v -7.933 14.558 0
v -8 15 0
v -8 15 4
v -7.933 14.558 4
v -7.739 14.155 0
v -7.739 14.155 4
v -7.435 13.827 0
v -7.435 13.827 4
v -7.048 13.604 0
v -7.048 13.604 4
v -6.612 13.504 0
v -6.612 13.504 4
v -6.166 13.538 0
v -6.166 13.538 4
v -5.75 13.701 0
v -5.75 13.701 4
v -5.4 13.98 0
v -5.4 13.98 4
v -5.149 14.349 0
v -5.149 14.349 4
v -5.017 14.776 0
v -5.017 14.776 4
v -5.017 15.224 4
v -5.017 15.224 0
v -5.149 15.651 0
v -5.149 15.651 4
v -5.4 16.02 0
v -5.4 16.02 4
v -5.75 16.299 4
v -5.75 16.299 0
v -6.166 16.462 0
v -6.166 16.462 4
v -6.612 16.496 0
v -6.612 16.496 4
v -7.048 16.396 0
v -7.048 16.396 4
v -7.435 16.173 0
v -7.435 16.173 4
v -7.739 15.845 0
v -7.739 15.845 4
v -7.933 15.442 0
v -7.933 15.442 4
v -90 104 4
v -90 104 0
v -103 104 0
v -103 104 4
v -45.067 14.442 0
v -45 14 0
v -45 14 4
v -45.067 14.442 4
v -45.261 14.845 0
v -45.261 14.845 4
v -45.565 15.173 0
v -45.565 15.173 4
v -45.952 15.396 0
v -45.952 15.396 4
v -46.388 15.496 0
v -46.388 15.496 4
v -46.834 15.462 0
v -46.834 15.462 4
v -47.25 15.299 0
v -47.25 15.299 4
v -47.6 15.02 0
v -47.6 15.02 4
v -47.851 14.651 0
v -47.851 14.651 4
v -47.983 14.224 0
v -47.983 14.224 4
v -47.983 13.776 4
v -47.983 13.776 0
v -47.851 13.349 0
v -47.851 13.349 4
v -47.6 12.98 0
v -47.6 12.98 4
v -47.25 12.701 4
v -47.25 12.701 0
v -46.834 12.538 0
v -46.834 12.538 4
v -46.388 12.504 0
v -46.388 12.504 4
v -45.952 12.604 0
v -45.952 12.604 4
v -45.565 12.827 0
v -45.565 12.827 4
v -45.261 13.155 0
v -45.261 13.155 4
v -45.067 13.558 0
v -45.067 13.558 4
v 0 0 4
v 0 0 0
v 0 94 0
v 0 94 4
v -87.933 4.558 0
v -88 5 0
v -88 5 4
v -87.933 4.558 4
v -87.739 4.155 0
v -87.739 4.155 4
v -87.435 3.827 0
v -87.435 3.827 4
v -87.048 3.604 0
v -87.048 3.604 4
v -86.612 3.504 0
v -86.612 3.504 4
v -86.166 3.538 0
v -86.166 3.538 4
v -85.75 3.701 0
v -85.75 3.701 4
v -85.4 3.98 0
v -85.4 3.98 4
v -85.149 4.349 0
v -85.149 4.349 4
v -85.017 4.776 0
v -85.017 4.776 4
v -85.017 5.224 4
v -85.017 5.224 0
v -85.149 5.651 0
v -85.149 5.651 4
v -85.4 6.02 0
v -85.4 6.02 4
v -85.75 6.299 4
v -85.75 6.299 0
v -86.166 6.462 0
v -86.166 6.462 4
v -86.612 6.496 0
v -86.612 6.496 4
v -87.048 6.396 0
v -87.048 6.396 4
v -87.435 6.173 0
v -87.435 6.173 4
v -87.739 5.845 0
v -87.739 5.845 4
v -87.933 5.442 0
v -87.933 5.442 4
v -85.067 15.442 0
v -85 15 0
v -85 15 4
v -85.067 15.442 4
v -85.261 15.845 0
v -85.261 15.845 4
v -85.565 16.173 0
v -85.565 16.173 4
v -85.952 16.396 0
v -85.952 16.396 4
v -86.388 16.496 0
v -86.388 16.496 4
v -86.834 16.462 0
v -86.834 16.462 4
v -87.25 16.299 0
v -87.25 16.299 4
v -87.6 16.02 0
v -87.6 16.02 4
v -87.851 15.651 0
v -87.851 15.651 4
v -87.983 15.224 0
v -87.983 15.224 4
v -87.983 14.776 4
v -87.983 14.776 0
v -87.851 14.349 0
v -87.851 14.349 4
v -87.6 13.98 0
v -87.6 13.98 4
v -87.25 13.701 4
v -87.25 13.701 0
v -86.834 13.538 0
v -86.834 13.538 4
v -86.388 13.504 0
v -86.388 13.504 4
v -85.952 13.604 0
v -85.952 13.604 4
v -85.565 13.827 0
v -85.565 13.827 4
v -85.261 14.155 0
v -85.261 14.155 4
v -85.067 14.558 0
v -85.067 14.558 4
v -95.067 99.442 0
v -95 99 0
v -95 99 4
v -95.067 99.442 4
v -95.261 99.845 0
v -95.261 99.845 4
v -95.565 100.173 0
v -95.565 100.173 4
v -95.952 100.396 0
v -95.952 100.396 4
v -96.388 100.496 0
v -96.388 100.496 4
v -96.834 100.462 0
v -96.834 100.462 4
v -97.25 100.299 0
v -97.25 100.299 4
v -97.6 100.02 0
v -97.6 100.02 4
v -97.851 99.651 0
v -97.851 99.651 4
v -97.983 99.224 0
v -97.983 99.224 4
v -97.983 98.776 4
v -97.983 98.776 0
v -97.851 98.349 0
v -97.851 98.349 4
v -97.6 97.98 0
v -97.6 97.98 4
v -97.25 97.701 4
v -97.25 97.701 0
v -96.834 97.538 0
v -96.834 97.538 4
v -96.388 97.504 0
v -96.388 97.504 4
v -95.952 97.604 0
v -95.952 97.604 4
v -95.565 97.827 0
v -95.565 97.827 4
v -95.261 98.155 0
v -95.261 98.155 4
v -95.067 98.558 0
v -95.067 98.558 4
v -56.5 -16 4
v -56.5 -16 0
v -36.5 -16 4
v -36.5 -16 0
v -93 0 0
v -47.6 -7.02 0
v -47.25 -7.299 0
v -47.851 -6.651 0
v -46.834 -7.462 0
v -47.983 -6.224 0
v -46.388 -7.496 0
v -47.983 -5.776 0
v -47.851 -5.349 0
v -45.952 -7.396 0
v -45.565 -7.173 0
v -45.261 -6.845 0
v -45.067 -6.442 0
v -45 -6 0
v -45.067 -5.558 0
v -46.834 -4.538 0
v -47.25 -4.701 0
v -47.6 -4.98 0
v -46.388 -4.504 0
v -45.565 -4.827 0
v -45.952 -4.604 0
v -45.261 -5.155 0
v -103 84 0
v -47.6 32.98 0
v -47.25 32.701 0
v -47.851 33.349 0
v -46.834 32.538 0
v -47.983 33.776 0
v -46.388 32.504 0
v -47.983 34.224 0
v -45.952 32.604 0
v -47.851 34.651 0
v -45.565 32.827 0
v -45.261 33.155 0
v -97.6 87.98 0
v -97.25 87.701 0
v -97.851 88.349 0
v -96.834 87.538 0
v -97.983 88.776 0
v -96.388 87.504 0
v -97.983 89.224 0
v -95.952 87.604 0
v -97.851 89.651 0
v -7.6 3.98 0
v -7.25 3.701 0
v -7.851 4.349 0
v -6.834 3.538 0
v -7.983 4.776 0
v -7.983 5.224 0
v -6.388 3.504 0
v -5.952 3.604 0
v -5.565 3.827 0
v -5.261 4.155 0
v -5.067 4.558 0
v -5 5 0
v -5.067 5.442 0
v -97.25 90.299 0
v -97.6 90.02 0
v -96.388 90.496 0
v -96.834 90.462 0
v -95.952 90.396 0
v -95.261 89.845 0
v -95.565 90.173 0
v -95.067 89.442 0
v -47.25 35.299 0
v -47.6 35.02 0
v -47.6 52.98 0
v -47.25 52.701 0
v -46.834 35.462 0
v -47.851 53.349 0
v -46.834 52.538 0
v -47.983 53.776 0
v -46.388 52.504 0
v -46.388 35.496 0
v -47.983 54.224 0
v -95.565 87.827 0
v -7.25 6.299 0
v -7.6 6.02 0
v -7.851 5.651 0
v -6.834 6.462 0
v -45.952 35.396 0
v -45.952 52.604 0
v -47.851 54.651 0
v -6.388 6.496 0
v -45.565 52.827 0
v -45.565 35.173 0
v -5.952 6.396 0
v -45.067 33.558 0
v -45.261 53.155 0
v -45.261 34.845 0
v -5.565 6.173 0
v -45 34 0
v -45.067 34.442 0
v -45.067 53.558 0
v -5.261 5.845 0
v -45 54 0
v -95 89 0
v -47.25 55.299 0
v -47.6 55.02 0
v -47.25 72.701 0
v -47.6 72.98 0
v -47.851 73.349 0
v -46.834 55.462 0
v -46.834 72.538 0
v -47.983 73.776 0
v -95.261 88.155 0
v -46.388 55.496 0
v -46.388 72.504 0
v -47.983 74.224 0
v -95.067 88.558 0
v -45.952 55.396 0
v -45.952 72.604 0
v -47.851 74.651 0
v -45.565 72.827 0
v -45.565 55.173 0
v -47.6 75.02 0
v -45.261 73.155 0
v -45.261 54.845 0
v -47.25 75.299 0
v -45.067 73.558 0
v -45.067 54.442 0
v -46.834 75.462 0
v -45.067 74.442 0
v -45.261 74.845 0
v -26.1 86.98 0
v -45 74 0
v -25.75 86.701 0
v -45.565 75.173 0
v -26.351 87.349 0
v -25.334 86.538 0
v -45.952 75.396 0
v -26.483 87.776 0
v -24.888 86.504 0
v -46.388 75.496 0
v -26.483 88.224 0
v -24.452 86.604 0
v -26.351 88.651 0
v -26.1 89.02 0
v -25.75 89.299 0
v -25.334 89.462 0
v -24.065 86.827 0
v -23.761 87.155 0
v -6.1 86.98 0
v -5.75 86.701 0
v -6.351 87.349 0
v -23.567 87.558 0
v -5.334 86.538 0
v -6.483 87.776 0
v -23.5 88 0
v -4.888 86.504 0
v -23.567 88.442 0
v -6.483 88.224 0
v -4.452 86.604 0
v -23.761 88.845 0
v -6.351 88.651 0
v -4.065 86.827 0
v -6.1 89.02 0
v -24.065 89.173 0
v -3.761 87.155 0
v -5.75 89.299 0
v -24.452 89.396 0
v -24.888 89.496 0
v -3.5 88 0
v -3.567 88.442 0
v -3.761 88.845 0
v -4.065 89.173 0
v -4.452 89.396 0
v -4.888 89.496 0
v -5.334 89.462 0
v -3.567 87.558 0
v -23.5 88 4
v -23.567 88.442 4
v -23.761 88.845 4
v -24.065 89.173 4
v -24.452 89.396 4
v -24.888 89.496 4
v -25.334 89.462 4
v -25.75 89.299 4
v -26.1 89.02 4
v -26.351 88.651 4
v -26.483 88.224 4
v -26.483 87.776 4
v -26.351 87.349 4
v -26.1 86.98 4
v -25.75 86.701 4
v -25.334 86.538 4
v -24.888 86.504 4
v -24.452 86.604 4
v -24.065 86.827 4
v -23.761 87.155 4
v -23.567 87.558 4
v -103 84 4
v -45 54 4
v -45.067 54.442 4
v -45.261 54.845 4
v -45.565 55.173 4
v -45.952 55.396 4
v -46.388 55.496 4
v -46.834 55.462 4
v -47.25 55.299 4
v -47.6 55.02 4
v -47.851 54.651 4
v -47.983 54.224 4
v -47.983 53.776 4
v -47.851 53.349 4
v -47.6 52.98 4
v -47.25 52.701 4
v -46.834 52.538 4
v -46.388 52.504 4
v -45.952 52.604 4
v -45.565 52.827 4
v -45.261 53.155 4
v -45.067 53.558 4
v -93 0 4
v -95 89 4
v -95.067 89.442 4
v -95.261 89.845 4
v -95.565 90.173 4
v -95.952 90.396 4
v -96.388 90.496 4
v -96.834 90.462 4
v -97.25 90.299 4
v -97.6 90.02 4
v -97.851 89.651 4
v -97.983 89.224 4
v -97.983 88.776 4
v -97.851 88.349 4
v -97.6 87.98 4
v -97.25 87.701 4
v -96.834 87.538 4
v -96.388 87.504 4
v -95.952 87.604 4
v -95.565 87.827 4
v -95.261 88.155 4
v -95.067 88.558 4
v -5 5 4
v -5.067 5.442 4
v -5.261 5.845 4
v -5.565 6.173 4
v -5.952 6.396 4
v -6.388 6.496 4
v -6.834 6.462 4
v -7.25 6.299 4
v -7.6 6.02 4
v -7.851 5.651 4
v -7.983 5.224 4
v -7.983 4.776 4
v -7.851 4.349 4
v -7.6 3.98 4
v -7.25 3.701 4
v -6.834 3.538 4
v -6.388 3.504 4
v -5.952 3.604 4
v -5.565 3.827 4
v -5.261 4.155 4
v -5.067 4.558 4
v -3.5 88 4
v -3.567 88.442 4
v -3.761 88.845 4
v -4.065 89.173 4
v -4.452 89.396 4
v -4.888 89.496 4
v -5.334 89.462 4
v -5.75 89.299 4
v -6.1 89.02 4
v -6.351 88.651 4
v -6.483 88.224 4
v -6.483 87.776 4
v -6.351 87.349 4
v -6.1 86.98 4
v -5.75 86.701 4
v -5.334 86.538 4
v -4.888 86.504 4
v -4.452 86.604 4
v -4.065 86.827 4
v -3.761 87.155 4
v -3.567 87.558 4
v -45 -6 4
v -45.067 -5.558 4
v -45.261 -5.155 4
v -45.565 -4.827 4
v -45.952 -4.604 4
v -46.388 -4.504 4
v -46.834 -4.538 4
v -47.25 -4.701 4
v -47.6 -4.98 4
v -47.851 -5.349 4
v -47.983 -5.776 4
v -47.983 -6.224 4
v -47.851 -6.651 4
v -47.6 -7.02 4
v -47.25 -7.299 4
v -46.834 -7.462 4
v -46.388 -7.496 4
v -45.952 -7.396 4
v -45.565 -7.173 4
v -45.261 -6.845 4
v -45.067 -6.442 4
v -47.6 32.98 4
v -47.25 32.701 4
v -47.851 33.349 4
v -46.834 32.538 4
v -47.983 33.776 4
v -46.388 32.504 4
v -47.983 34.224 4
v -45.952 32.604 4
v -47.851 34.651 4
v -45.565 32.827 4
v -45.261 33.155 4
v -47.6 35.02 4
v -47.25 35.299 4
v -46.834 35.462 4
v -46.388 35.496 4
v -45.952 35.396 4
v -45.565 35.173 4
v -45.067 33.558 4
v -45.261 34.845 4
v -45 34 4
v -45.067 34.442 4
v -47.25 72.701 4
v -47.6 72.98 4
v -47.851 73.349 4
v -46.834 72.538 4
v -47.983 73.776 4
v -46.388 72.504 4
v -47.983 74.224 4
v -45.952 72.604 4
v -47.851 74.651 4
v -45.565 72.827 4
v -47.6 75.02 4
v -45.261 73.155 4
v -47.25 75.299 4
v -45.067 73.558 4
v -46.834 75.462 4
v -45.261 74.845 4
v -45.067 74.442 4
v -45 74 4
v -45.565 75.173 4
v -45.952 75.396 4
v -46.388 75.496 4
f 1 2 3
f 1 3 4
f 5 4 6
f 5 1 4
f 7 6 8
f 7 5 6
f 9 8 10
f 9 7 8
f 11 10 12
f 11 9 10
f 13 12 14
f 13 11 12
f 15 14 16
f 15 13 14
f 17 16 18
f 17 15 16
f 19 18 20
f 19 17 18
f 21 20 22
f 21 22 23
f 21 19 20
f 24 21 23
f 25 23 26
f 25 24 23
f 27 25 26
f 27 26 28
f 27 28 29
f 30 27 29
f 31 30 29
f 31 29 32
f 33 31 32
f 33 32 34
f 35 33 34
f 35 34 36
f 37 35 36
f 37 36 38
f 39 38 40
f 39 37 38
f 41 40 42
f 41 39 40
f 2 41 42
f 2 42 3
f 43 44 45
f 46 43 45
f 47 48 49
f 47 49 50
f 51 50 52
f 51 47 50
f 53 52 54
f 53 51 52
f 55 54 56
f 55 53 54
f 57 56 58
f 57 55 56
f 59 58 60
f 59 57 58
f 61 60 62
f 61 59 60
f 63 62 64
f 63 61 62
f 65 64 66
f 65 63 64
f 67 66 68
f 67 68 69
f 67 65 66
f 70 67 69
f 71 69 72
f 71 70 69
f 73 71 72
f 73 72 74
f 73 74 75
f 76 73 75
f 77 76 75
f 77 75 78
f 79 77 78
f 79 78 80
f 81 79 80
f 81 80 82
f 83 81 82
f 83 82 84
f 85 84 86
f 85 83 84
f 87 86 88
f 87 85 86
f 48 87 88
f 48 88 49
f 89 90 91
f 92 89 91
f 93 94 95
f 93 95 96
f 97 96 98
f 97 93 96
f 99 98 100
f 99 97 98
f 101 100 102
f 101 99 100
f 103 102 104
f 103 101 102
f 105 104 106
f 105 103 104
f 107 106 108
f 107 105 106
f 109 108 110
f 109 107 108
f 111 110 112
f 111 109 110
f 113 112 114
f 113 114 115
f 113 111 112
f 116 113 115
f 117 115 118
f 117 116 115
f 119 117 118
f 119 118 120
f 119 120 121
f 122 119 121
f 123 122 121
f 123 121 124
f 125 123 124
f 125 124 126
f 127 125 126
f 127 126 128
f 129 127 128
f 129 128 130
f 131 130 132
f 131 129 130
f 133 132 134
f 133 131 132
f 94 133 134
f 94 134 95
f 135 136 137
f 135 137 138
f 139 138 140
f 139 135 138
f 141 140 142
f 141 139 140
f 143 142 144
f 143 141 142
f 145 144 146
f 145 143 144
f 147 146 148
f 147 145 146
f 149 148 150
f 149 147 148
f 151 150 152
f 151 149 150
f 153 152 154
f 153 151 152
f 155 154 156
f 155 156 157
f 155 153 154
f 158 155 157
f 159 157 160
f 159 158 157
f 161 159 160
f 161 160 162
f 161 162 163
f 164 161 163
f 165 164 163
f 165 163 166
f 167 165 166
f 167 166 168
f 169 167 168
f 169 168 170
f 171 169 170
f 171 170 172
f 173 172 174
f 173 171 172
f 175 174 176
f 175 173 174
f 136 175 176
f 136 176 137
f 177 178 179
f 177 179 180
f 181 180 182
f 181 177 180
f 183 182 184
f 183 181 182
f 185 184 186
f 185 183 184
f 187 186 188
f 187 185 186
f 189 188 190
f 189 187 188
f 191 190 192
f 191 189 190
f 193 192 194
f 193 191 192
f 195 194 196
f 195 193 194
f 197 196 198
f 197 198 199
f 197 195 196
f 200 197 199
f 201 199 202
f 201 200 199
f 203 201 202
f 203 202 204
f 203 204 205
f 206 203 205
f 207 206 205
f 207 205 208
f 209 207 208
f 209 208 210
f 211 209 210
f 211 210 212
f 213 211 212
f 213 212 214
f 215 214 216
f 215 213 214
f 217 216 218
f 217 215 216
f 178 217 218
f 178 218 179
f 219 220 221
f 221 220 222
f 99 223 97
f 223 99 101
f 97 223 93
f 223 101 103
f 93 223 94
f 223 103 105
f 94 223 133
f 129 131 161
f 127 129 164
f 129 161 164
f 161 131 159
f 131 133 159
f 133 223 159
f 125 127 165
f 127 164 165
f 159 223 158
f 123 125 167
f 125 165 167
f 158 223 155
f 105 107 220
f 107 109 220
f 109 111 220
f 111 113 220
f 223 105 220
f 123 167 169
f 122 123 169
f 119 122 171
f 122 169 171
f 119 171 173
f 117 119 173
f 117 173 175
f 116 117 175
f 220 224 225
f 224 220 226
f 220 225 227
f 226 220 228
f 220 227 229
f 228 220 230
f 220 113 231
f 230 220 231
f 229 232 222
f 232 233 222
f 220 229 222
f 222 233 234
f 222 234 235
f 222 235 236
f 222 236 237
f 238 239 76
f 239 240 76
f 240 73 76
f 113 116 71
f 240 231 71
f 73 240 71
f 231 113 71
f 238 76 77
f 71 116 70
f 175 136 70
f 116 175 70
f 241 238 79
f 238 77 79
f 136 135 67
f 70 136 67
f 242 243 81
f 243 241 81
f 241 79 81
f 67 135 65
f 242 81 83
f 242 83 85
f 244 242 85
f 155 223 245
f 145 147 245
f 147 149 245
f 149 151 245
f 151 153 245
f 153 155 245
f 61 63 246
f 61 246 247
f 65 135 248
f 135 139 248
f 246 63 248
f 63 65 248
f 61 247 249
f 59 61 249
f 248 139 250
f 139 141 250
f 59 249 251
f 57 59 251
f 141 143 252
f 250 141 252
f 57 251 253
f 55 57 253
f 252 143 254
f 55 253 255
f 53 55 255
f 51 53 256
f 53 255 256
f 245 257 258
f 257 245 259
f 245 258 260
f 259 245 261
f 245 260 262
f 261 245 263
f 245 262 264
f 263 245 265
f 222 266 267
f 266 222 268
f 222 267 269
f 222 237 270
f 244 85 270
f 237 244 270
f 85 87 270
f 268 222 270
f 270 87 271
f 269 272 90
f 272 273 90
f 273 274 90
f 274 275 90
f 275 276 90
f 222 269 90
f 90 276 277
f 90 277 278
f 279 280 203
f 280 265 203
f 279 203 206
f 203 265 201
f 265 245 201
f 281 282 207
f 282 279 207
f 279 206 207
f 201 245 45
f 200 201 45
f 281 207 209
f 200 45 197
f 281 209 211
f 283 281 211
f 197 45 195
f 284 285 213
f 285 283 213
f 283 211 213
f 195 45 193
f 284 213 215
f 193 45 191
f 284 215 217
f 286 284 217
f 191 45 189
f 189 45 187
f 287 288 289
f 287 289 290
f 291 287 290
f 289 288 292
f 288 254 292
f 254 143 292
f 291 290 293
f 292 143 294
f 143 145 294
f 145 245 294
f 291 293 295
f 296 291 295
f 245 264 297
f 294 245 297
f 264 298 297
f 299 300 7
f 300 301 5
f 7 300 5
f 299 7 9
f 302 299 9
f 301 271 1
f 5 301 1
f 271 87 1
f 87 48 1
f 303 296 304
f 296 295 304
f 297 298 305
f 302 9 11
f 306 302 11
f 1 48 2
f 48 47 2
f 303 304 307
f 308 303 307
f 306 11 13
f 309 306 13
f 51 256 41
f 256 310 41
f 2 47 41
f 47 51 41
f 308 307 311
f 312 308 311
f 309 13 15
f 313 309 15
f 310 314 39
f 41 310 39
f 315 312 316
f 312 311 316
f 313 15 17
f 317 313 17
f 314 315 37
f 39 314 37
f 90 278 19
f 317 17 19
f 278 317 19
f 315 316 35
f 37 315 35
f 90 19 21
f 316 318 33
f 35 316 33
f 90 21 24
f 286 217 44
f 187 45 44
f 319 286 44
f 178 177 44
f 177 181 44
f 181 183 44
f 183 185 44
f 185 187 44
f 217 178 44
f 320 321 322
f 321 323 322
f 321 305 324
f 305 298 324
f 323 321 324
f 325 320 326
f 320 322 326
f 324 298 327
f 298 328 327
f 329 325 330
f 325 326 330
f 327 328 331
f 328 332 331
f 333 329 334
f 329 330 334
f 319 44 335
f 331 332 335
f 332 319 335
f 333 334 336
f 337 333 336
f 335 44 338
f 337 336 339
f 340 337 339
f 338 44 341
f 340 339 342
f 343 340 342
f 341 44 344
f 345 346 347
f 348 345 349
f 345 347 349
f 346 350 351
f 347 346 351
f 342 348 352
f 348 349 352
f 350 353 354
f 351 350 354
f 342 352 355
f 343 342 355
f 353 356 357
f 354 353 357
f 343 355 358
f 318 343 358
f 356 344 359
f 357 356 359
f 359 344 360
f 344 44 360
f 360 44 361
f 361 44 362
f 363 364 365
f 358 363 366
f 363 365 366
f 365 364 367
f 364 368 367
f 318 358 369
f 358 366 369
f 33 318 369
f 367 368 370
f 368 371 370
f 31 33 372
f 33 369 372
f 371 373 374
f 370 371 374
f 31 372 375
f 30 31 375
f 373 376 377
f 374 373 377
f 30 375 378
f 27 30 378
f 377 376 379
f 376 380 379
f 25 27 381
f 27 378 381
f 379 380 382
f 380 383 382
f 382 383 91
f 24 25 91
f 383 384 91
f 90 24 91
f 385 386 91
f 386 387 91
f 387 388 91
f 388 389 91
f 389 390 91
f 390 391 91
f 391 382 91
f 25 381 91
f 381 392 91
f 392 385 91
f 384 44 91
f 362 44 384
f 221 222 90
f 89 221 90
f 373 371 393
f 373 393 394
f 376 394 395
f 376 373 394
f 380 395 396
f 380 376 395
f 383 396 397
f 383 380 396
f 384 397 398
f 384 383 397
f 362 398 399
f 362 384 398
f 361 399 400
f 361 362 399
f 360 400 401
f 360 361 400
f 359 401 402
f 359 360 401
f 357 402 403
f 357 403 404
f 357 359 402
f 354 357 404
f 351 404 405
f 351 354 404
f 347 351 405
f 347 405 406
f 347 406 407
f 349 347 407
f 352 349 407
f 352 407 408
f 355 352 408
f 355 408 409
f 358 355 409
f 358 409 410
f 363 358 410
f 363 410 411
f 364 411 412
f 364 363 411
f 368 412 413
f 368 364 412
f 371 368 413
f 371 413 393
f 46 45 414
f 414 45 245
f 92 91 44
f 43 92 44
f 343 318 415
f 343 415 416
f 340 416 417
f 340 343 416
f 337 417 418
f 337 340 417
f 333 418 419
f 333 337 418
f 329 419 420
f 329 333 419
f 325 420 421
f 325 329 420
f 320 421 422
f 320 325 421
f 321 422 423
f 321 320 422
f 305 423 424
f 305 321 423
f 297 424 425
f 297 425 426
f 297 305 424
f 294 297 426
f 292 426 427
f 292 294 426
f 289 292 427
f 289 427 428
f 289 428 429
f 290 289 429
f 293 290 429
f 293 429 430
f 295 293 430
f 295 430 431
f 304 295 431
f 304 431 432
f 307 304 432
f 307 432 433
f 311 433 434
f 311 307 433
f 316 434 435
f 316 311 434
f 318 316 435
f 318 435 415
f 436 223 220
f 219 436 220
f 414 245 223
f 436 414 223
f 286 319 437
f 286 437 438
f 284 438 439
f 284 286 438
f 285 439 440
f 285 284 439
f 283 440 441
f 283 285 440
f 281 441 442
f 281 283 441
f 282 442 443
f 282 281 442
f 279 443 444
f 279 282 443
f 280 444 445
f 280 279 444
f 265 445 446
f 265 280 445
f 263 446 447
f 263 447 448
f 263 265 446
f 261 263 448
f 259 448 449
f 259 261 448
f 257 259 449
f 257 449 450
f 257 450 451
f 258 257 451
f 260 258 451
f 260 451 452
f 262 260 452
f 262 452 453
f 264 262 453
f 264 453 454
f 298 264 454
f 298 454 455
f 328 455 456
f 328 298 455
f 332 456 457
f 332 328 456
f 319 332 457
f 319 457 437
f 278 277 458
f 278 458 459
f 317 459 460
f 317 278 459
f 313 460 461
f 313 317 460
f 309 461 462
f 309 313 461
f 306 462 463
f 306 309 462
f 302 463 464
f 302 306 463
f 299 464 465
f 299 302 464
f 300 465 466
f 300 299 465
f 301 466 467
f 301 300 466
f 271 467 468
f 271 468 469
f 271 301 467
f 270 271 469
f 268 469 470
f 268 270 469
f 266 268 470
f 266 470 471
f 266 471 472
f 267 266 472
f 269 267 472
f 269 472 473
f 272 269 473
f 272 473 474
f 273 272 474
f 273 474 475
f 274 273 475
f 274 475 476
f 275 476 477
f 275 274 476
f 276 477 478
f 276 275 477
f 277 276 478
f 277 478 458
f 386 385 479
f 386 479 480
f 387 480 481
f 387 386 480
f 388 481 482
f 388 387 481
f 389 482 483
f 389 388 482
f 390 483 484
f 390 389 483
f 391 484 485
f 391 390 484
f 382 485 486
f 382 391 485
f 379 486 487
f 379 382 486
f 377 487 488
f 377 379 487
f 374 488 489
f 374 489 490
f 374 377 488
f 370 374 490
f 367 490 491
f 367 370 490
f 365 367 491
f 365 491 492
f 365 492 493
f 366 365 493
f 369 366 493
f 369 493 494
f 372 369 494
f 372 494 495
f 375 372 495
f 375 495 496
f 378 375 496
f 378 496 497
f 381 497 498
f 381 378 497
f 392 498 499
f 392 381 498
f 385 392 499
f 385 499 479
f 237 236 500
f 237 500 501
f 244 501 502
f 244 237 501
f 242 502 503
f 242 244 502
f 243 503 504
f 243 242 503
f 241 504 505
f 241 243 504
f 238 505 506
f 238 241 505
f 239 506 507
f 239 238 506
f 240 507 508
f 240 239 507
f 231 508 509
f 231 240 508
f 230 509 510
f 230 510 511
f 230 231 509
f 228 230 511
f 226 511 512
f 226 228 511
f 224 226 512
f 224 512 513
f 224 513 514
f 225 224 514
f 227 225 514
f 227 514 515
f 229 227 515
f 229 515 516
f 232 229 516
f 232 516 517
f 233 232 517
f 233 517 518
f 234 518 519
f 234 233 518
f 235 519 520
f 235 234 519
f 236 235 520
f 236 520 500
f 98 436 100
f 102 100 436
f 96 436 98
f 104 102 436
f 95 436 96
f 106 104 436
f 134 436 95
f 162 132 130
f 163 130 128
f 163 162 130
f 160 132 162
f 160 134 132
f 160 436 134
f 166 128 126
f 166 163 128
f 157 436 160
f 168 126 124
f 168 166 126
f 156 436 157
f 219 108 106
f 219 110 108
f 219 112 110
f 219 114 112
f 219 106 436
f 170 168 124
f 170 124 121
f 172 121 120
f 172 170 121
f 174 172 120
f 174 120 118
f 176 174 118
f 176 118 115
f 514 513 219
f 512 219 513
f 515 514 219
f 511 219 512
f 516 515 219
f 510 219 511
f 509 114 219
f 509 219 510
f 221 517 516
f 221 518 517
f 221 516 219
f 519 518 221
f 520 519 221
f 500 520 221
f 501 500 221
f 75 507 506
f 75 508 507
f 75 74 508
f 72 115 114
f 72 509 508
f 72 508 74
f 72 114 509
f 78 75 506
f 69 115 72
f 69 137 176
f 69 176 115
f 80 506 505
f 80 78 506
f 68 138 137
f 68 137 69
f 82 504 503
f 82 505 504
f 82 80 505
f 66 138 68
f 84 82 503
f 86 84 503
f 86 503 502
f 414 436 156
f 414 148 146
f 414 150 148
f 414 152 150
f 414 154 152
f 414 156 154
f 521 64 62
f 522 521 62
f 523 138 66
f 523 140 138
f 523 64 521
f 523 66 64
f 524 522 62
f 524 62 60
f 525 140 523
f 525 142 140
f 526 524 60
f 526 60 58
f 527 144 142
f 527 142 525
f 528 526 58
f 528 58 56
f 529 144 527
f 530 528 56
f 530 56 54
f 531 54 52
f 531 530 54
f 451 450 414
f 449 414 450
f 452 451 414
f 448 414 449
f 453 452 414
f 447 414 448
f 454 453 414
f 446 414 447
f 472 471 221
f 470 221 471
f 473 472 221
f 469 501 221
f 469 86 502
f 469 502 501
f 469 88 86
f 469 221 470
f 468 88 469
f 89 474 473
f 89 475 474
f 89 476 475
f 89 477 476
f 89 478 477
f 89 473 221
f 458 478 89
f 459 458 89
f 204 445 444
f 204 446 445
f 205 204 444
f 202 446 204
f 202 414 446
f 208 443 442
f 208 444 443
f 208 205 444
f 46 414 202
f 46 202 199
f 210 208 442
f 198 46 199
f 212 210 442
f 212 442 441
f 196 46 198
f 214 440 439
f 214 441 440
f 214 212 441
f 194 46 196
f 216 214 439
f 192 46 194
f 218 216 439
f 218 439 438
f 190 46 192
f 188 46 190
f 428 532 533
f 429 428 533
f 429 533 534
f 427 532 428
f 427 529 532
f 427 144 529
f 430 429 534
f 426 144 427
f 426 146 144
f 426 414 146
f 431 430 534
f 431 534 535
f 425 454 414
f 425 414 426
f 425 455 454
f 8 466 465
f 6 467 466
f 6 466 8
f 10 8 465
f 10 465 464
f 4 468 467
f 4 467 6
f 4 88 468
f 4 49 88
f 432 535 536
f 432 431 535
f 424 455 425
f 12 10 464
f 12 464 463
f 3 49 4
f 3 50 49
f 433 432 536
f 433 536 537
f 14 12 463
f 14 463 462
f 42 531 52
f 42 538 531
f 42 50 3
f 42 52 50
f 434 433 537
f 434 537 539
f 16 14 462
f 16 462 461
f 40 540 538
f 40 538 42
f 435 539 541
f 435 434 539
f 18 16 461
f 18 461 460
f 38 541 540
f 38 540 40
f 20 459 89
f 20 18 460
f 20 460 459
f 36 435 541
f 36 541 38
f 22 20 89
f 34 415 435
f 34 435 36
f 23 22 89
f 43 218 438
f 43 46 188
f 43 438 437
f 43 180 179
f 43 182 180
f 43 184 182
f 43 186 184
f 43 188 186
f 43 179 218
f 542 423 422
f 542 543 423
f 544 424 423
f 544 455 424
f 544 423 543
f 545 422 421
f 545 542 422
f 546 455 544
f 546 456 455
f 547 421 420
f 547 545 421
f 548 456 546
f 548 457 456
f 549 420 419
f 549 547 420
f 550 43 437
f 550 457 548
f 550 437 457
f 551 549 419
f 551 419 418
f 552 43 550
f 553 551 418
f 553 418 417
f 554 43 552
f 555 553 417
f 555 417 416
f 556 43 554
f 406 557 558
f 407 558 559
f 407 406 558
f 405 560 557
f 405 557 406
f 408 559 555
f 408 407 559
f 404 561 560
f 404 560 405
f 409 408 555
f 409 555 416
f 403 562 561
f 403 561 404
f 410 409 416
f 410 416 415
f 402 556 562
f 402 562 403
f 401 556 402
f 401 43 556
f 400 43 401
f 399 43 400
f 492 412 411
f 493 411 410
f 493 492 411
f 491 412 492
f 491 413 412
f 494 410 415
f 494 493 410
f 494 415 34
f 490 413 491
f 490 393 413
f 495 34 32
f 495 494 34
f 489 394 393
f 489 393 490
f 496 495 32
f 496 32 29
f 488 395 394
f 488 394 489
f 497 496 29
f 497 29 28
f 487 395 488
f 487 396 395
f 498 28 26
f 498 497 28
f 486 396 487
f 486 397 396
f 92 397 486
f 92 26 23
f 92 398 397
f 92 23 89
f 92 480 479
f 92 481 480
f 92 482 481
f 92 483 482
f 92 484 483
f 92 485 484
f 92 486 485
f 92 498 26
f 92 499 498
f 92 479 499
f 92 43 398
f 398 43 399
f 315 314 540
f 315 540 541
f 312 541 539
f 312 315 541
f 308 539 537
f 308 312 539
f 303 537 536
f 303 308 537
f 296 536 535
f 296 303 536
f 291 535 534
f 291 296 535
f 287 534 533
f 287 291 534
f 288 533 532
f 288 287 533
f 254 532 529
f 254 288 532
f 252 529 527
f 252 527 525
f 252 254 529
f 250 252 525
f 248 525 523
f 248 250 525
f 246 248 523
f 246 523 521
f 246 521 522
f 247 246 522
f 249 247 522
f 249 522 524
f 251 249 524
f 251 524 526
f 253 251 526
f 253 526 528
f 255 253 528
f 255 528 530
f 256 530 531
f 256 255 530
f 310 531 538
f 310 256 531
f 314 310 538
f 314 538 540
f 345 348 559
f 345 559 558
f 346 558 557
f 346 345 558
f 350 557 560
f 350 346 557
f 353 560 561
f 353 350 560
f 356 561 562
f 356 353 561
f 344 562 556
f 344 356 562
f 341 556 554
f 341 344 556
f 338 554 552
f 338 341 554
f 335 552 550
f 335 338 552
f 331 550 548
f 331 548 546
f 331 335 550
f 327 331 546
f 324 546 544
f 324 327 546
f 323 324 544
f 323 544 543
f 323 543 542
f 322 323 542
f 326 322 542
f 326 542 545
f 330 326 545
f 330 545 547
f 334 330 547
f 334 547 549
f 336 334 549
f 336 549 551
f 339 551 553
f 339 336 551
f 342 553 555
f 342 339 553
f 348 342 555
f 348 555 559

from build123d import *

# Parameters (mm, degrees)
SKETCH_1_R      = 1.5
EXTRUDE_1_DEPTH = 4


with BuildPart() as part:
    # 草图1 → 凸台-拉伸1 (new body)
    with BuildSketch(Plane.XY):
        Polygon((0, 0), (0, 94), (-90, 104), (-103, 104), (-103, 84), (-93, 0), (-56.5, -16), (-36.5, -16), align=None)
        with Locations((-86.5, 15)):
            Circle(SKETCH_1_R, mode=Mode.SUBTRACT)
        with Locations(Location((-86.5, 5, 0), (0, 0, 180))):
            Circle(SKETCH_1_R, mode=Mode.SUBTRACT)
        with Locations((-6.5, 5)):
            Circle(SKETCH_1_R, mode=Mode.SUBTRACT)
        with Locations(Location((-6.5, 15, 0), (0, 0, 180))):
            Circle(SKETCH_1_R, mode=Mode.SUBTRACT)
        with Locations((-96.5, 99)):
            Circle(SKETCH_1_R, mode=Mode.SUBTRACT)
        with Locations((-96.5, 89)):
            Circle(SKETCH_1_R, mode=Mode.SUBTRACT)
        with Locations((-46.5, 14)):
            Circle(SKETCH_1_R, mode=Mode.SUBTRACT)
        with Locations((-46.5, 34)):
            Circle(SKETCH_1_R, mode=Mode.SUBTRACT)
        with Locations((-46.5, 54)):
            Circle(SKETCH_1_R, mode=Mode.SUBTRACT)
        with Locations((-46.5, 74)):
            Circle(SKETCH_1_R, mode=Mode.SUBTRACT)
        with Locations((-46.5, -6)):
            Circle(SKETCH_1_R, mode=Mode.SUBTRACT)
        with Locations((-25, 88)):
            Circle(SKETCH_1_R, mode=Mode.SUBTRACT)
        with Locations((-5, 88)):
            Circle(SKETCH_1_R, mode=Mode.SUBTRACT)
    extrude(amount=EXTRUDE_1_DEPTH)


solid = part.part
